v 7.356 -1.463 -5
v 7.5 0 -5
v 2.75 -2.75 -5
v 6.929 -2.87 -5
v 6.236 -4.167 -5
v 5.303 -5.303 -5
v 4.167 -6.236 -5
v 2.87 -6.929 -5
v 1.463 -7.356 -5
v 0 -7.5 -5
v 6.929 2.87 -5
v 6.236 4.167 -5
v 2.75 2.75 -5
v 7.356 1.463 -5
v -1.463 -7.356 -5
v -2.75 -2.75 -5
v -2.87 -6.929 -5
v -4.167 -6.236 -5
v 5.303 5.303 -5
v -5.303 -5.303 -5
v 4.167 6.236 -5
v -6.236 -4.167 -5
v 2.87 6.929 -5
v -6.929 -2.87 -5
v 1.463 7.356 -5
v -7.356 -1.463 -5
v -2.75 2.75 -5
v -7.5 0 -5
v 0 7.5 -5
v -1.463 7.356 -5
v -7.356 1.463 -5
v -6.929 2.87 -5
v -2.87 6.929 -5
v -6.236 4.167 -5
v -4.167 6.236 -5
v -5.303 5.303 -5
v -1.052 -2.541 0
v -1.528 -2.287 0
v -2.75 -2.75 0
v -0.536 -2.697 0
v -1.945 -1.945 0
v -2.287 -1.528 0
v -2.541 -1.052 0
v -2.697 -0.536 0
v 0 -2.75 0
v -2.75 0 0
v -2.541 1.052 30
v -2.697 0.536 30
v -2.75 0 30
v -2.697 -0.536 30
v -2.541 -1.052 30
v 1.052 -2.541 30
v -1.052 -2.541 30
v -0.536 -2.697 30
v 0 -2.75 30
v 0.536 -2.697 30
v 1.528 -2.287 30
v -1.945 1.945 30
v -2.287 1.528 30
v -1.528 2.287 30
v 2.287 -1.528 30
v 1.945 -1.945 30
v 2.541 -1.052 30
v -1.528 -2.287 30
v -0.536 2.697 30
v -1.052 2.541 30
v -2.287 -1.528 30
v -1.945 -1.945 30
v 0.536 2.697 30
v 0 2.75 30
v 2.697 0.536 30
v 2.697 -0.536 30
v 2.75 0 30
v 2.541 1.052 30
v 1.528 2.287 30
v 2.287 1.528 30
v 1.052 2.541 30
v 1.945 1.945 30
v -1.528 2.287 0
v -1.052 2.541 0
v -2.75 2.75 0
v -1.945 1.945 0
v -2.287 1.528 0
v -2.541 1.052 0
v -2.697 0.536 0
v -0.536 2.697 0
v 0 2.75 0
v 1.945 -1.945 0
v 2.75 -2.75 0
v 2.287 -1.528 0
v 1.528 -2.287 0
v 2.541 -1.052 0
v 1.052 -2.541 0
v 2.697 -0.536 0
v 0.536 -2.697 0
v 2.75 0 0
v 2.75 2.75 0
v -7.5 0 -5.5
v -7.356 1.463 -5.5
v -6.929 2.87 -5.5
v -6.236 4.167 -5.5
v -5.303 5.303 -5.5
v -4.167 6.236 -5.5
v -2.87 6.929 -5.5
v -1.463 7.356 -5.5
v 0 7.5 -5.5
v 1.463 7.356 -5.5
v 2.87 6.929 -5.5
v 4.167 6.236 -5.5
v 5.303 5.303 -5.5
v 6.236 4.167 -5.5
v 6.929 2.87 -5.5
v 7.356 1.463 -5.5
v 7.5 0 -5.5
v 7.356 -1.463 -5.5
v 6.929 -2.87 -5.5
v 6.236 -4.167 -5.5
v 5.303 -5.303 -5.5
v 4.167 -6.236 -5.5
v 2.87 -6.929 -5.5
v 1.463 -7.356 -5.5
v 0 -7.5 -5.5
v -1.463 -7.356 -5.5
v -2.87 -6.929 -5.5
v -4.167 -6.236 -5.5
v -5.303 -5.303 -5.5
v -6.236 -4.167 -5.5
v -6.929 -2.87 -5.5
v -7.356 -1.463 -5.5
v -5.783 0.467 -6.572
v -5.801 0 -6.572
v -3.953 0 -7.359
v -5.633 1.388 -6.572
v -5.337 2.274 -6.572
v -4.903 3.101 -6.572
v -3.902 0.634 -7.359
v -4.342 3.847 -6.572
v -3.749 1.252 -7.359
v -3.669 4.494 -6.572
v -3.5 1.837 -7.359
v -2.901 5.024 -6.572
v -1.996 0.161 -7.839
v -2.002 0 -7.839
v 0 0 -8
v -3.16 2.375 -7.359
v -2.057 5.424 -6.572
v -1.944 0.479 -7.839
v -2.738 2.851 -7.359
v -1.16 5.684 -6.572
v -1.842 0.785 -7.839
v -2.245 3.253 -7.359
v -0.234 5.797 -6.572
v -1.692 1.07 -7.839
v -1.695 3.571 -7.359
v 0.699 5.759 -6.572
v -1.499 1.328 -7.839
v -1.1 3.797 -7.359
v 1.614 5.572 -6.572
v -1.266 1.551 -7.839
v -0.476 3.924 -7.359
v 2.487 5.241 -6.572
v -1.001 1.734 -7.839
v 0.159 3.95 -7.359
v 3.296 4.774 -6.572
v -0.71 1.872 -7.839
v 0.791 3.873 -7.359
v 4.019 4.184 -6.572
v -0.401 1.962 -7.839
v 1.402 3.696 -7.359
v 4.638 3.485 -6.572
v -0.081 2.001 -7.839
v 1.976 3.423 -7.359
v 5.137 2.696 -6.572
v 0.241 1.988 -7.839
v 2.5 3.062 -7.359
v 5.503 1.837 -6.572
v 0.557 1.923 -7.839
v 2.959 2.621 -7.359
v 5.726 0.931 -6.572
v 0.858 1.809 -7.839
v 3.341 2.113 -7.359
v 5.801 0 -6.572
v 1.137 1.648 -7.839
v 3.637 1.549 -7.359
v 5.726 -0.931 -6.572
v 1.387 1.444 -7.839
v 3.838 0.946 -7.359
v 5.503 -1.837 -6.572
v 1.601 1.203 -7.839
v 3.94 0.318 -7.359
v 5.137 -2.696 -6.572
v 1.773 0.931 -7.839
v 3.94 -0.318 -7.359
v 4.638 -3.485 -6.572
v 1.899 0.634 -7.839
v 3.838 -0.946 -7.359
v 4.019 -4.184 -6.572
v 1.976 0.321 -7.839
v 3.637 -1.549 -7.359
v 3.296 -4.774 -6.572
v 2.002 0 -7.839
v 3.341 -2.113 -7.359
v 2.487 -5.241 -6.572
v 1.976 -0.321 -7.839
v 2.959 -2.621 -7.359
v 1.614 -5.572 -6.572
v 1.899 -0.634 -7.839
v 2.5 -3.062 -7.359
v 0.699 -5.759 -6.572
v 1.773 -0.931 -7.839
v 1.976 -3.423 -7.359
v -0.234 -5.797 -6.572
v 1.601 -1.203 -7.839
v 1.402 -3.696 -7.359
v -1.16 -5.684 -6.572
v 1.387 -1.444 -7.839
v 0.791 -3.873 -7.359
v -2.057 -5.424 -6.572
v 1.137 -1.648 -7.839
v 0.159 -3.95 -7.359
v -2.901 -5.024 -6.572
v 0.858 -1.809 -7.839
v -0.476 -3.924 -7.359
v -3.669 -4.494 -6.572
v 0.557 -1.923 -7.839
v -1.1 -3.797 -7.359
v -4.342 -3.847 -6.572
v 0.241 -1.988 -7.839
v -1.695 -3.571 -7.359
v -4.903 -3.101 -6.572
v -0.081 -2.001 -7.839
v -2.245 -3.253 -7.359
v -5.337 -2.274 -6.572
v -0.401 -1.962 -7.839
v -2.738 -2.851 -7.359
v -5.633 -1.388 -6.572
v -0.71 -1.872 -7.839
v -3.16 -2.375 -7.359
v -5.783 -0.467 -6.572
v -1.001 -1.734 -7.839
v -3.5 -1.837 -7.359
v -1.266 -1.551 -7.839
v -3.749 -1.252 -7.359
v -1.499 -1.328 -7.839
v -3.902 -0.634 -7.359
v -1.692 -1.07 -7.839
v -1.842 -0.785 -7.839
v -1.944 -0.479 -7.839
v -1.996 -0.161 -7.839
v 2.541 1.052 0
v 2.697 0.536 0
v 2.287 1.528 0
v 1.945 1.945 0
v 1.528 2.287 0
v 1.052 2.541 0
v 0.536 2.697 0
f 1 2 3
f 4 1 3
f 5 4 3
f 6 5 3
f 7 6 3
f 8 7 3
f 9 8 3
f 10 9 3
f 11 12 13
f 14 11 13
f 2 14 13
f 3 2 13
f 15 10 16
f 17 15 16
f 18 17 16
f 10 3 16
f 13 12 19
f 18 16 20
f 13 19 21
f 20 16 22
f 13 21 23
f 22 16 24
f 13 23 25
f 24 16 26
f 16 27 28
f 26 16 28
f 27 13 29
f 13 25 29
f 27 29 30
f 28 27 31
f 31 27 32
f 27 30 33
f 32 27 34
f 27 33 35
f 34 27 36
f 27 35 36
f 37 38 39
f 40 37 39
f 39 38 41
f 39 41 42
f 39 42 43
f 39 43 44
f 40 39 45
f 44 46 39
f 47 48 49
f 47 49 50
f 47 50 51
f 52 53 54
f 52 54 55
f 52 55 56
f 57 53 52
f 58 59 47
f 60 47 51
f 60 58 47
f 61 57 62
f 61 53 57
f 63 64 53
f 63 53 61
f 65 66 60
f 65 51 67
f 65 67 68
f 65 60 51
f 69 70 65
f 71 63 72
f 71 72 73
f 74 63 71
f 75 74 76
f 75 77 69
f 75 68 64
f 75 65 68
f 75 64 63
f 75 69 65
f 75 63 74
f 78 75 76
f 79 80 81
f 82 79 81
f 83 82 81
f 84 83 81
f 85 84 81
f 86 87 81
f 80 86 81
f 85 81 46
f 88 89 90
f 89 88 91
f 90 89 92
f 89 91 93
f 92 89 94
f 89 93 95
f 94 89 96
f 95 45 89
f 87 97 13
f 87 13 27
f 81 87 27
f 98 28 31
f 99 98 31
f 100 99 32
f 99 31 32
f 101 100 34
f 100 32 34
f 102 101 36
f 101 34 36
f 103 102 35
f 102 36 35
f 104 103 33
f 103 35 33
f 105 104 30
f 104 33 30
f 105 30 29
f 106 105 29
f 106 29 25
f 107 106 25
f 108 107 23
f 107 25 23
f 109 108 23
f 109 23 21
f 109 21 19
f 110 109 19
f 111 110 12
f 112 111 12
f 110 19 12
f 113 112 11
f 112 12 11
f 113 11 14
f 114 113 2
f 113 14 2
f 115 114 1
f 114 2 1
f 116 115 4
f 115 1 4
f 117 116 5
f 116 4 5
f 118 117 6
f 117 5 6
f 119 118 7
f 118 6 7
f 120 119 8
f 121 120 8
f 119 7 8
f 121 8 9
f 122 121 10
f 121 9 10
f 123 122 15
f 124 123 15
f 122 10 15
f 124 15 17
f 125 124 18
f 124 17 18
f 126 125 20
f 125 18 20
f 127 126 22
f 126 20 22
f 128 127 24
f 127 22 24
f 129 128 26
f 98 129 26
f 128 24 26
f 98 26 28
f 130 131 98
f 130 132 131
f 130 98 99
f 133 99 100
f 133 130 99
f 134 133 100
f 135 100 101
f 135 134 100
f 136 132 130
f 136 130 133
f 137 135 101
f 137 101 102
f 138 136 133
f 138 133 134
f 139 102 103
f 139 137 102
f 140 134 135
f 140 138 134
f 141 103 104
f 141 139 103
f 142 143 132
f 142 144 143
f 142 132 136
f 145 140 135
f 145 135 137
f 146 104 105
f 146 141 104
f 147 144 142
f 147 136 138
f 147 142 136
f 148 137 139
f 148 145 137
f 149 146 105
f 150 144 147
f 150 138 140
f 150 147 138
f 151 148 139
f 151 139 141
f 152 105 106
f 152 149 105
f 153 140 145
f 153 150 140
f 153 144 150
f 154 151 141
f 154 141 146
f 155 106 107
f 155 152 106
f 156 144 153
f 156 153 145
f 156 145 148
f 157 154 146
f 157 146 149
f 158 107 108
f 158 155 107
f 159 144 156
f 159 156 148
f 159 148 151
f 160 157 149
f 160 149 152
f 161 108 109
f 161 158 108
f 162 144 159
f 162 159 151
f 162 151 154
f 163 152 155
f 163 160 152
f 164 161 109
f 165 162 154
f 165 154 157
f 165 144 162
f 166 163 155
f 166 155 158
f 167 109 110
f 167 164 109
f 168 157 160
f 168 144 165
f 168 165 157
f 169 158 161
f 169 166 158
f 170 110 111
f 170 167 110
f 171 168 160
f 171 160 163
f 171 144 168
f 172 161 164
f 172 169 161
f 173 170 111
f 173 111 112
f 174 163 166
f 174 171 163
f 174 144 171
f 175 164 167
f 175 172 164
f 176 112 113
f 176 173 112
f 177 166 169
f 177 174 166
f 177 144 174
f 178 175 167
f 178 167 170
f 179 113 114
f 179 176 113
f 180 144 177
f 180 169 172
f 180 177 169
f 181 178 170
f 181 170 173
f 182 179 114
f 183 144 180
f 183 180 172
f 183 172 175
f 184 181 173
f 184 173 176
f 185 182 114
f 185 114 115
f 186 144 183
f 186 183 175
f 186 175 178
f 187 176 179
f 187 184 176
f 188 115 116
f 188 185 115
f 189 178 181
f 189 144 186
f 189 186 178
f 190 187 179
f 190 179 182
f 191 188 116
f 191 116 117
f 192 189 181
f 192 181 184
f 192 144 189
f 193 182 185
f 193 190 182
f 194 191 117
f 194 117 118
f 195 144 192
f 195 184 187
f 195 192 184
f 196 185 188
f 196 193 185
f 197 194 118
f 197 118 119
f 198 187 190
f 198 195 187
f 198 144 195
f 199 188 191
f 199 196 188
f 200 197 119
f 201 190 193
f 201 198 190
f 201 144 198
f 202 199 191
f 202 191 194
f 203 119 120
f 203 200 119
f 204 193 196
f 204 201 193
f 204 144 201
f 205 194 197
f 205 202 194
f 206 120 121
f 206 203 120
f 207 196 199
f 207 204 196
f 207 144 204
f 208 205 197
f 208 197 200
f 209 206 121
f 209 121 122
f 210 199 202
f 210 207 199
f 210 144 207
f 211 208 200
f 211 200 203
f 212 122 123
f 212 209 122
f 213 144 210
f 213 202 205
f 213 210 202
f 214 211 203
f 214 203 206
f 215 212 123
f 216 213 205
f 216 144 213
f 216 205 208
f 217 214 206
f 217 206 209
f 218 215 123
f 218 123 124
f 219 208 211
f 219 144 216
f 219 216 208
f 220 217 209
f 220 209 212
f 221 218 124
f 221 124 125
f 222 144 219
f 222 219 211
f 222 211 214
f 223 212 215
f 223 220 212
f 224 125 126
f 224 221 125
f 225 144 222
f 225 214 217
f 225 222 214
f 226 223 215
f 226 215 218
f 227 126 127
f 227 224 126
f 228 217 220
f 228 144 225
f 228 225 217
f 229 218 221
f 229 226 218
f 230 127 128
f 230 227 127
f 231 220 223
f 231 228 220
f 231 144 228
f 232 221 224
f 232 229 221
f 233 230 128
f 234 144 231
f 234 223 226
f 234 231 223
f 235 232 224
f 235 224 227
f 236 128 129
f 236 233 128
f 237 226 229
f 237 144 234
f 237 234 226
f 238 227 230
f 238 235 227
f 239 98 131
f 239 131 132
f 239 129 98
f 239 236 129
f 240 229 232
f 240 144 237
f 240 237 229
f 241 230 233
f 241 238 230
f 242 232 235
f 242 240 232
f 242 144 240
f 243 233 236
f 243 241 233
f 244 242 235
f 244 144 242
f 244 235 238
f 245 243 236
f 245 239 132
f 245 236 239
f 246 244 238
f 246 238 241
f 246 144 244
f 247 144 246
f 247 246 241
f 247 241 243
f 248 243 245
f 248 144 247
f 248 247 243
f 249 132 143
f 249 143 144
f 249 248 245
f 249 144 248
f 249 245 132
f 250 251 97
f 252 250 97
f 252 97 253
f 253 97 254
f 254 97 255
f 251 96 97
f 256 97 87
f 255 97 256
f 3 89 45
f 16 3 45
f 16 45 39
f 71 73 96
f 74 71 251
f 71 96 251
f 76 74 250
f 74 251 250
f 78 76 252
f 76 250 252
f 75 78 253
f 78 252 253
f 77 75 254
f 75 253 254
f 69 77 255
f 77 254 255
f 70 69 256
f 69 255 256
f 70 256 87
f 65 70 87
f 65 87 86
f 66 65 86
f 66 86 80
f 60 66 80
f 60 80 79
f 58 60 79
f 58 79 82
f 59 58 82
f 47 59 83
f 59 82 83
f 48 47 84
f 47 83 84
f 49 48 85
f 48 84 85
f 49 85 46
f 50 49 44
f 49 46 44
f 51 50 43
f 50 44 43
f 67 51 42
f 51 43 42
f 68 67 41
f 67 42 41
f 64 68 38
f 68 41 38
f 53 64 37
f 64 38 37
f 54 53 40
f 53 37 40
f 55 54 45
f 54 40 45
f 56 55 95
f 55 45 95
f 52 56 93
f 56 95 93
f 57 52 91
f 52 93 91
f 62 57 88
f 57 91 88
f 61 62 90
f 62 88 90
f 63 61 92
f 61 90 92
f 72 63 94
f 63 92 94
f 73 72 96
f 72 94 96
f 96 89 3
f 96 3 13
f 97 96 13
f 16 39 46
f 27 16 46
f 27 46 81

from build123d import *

# Parameters (mm, degrees)
ESQUISSE1_R        = 2.75
BOSS_EXTRU_1_DEPTH = 30
ESQUISSE2_W        = 5.5
ESQUISSE2_H        = 5.5
BOSS_EXTRU_2_DEPTH = 5
ESQUISSE3_R        = 7.5
BOSS_EXTRU_3_DEPTH = 0.5
D_ME1_FACE_RADIUS  = 7.5
D_ME1_HEIGHT       = 2.5


with BuildPart() as part:
    # Esquisse1 → Boss.-Extru.1 (new body)
    with BuildSketch(Plane.XY):
        Circle(ESQUISSE1_R)
    extrude(amount=BOSS_EXTRU_1_DEPTH)

    # Esquisse2 → Boss.-Extru.2 (add)
    with BuildSketch(Plane(origin=(0, 0, 0), x_dir=(-1, 0, 0), z_dir=(0, 0, -1))):
        Rectangle(ESQUISSE2_W, ESQUISSE2_H)
    extrude(amount=BOSS_EXTRU_2_DEPTH)

    # Esquisse3 → Boss.-Extru.3 (add)
    with BuildSketch(Plane(origin=(0, 0, -5), x_dir=(-1, 0, 0), z_dir=(0, 0, -1))):
        Circle(ESQUISSE3_R)
    extrude(amount=BOSS_EXTRU_3_DEPTH)

    # Dôme1: a dome of height H over a round flat face of radius A is a cap of a sphere of radius (A * A + H * H) / (2 * H)
    d_me1_r = (D_ME1_FACE_RADIUS * D_ME1_FACE_RADIUS + D_ME1_HEIGHT * D_ME1_HEIGHT) / (2 * D_ME1_HEIGHT)
    d_me1_base = Plane((0, 0, -5.5), z_dir=(0, 0, -1))
    with Locations(d_me1_base.offset(D_ME1_HEIGHT - d_me1_r)):
        d_me1_ball = Sphere(d_me1_r, mode=Mode.PRIVATE)
    add(split(d_me1_ball, bisect_by=d_me1_base, keep=Keep.TOP, mode=Mode.PRIVATE))


solid = part.part
